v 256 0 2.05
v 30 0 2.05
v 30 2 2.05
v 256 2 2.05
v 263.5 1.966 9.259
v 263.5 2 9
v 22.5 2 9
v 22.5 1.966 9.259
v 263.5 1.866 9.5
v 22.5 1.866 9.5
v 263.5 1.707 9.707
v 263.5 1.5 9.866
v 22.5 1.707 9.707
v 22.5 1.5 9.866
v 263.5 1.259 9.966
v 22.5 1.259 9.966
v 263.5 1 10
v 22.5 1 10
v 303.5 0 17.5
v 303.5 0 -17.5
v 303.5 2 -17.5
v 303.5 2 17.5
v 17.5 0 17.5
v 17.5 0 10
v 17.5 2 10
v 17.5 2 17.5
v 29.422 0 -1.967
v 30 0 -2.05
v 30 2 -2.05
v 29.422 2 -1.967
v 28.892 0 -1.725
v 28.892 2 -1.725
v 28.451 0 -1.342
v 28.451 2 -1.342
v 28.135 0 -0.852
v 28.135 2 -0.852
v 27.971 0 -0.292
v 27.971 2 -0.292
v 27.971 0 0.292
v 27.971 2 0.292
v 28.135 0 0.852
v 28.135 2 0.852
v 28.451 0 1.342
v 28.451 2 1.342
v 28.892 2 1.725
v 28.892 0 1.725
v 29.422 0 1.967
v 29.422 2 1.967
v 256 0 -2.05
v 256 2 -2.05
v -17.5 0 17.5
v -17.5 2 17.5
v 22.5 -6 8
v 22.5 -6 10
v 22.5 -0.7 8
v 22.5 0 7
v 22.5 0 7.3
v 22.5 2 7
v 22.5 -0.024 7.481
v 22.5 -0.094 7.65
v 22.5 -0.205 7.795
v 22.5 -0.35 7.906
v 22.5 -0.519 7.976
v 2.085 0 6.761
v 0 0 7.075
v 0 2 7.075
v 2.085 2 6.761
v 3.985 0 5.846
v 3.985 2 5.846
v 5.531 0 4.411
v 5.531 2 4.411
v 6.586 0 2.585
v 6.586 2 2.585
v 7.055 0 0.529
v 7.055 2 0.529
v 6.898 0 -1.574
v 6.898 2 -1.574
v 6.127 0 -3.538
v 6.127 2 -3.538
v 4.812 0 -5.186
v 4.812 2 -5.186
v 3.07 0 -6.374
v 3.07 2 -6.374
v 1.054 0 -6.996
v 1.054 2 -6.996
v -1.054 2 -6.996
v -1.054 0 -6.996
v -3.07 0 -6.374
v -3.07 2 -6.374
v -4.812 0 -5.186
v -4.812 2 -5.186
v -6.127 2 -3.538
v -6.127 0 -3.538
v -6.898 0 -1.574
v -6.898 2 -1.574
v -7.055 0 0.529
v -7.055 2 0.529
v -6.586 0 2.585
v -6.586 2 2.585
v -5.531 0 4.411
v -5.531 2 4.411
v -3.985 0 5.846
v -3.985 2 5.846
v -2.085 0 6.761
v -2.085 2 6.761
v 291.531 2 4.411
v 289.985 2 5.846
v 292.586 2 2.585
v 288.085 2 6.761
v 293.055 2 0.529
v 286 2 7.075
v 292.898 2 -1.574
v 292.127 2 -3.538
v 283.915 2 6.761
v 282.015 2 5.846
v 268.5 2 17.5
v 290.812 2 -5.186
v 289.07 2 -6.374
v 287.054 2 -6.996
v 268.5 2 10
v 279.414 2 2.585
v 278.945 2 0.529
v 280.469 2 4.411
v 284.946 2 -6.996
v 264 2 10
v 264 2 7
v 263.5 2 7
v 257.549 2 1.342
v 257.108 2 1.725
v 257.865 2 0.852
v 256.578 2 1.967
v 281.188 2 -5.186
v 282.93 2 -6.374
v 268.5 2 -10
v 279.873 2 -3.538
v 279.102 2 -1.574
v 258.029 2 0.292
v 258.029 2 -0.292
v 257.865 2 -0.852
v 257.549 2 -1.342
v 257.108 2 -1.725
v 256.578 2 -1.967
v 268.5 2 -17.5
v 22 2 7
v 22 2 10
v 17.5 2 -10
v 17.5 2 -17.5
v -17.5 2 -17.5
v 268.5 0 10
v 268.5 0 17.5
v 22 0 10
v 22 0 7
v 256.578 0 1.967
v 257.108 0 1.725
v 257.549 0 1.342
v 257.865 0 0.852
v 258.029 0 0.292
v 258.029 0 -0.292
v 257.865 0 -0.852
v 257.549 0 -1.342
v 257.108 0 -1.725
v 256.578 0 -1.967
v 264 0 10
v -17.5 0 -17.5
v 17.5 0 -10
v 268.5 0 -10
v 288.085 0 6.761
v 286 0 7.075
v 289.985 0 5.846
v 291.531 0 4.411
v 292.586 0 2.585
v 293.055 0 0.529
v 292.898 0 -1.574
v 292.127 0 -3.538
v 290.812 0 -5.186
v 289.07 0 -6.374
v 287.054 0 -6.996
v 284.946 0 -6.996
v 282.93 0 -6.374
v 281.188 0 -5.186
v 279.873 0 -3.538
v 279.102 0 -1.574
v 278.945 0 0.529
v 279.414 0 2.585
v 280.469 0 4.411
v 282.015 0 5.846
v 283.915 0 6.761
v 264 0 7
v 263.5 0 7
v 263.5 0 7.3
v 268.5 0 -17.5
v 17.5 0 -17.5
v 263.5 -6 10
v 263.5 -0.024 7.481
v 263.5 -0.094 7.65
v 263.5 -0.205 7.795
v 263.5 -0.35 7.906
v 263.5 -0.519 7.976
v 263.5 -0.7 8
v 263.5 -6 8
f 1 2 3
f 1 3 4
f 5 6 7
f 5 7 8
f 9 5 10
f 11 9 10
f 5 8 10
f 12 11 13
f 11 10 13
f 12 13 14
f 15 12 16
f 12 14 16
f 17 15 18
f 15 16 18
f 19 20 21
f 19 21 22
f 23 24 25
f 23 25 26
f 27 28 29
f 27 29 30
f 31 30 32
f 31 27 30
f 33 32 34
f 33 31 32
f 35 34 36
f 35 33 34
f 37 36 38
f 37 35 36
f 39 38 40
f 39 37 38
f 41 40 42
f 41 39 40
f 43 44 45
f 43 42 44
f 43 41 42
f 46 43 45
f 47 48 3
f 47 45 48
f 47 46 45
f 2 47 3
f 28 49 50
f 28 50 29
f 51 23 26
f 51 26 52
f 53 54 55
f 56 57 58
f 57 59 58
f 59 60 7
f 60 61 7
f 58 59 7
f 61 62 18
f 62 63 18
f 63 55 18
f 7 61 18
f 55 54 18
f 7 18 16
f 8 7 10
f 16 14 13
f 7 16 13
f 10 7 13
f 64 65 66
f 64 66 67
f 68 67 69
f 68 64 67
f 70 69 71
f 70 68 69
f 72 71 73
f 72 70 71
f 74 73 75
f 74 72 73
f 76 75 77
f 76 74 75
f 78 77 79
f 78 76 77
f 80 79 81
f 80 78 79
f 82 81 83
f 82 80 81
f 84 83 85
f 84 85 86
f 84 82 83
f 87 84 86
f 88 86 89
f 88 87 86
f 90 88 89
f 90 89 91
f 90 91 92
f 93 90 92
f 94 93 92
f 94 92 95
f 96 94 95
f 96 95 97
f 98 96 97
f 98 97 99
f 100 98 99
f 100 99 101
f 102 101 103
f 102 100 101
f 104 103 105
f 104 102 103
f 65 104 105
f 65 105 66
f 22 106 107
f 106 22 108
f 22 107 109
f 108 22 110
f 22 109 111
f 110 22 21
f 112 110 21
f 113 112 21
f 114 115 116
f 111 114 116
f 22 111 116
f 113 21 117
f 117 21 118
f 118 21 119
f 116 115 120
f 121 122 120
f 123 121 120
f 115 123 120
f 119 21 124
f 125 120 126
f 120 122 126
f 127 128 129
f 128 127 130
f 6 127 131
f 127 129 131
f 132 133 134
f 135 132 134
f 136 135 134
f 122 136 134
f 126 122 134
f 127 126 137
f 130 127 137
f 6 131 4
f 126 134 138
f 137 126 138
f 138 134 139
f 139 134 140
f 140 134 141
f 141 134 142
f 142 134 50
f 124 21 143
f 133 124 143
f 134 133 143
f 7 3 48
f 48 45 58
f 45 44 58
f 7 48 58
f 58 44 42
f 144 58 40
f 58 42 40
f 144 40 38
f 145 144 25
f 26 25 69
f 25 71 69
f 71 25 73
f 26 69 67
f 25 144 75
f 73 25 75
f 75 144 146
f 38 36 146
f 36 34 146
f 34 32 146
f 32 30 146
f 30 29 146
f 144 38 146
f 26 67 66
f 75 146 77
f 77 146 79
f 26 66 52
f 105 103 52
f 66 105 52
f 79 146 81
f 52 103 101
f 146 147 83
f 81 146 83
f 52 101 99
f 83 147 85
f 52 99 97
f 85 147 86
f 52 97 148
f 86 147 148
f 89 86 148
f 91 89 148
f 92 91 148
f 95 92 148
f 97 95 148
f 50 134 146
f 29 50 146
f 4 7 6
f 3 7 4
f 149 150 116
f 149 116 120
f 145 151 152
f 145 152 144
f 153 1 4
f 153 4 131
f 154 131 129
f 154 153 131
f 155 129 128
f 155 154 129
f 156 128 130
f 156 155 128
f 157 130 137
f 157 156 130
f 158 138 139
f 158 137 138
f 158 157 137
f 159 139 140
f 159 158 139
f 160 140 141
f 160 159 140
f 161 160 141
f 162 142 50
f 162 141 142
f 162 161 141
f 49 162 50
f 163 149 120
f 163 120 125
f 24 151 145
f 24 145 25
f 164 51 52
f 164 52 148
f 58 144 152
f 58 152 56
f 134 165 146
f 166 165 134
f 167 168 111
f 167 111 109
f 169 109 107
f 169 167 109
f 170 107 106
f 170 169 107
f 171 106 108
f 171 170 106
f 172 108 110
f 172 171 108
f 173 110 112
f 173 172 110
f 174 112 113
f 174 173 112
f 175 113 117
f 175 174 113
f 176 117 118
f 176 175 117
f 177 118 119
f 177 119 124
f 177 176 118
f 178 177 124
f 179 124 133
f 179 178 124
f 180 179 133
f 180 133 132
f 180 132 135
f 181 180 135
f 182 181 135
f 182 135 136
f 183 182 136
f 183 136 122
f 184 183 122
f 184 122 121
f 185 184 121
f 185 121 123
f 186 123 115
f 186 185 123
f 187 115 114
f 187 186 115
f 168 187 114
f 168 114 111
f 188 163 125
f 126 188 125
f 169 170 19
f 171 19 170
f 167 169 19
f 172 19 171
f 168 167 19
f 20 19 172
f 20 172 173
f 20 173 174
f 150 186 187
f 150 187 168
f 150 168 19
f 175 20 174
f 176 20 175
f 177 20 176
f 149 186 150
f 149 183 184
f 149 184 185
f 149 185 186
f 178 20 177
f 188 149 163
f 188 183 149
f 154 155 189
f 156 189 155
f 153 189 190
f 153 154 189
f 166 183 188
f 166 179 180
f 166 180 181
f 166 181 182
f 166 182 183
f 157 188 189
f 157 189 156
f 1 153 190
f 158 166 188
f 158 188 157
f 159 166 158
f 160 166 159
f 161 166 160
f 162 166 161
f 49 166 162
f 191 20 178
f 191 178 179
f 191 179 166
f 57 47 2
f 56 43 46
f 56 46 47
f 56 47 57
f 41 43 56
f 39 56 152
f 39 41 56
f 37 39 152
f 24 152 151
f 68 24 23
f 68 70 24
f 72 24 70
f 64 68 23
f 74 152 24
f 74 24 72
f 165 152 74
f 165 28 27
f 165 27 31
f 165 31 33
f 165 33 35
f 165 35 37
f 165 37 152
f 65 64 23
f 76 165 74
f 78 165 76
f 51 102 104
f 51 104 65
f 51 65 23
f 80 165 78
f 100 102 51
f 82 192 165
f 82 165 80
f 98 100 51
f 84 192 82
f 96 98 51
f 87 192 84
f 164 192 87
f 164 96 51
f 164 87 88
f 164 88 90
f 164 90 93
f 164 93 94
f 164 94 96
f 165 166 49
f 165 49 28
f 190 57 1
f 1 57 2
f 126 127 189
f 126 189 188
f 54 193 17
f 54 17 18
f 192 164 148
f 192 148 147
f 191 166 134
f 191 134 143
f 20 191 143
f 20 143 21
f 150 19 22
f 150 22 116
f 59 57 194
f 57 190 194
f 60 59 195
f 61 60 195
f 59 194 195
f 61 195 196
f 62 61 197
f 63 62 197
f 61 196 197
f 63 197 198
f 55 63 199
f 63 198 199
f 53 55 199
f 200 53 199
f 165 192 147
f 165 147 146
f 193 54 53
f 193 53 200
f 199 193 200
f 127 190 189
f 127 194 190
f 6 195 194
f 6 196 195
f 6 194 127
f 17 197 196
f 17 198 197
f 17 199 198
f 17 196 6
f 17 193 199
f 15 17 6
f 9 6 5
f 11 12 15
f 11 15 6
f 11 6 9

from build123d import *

# Parameters (mm, degrees)
SKETCH1_R           = 7.075
BOSS_EXTRUDE1_DEPTH = 2
SKETCH2_W           = 241
SKETCH2_H           = 2
BOSS_EXTRUDE2_DEPTH = 6
SKETCH3_W           = 0.5
SKETCH3_H           = 2
CUT_EXTRUDE1_DEPTH  = 3
FILLET1_R           = 1
FILLET2_R           = 0.7
CUT_EXTRUDE2_DEPTH  = 305.063315775


with BuildPart() as part:
    # Sketch1 → Boss-Extrude1 (new body)
    with BuildSketch(Plane(origin=(0, 0, 0), x_dir=(1, 0, 0), z_dir=(0, 1, 0))):
        Polygon((-17.5, 17.5), (17.5, 17.5), (17.5, 10), (268.5, 10), (268.5, 17.5), (303.5, 17.5), (303.5, -17.5), (268.5, -17.5), (268.5, -10), (17.5, -10), (17.5, -17.5), (-17.5, -17.5), align=None)
        with Locations(Location((0, 0, 0), (0, 0, 270))):
            Circle(SKETCH1_R, mode=Mode.SUBTRACT)
        with Locations(Location((286, 0, 0), (0, 0, 270))):
            Circle(SKETCH1_R, mode=Mode.SUBTRACT)
    extrude(amount=BOSS_EXTRUDE1_DEPTH)

    # Sketch2 → Boss-Extrude2 (add)
    with BuildSketch(Plane.XZ):
        with Locations((143, 9)):
            Rectangle(SKETCH2_W, SKETCH2_H)
    extrude(amount=BOSS_EXTRUDE2_DEPTH)

    # Sketch3 → Cut-Extrude1 (cut)
    with BuildSketch(Plane.XY.offset(10)):
        with Locations((22.25, 1)):
            Rectangle(SKETCH3_W, SKETCH3_H)
        with Locations((263.75, 1)):
            Rectangle(SKETCH3_W, SKETCH3_H)
    extrude(amount=-CUT_EXTRUDE1_DEPTH, mode=Mode.SUBTRACT)

    # Fillet1
    fillet1_edges = [part.edges().sort_by_distance(p)[0] for p in [
        (143, 2, 10),
    ]]
    fillet(fillet1_edges, radius=FILLET1_R)

    # Fillet2
    fillet2_edges = [part.edges().sort_by_distance(p)[0] for p in [
        (143, 0, 8),
    ]]
    fillet(fillet2_edges, radius=FILLET2_R)

    # Sketch4 → Cut-Extrude2 (cut, through all)
    with BuildSketch(Plane.XZ):
        with BuildLine():
            Line((30, 2.05), (256, 2.05))
            ThreePointArc((256, 2.05), (258.05, 0), (256, -2.05))
            Line((256, -2.05), (30, -2.05))
            ThreePointArc((30, -2.05), (27.95, 0), (30, 2.05))
        make_face()
    extrude(amount=-CUT_EXTRUDE2_DEPTH, mode=Mode.SUBTRACT)


solid = part.part
